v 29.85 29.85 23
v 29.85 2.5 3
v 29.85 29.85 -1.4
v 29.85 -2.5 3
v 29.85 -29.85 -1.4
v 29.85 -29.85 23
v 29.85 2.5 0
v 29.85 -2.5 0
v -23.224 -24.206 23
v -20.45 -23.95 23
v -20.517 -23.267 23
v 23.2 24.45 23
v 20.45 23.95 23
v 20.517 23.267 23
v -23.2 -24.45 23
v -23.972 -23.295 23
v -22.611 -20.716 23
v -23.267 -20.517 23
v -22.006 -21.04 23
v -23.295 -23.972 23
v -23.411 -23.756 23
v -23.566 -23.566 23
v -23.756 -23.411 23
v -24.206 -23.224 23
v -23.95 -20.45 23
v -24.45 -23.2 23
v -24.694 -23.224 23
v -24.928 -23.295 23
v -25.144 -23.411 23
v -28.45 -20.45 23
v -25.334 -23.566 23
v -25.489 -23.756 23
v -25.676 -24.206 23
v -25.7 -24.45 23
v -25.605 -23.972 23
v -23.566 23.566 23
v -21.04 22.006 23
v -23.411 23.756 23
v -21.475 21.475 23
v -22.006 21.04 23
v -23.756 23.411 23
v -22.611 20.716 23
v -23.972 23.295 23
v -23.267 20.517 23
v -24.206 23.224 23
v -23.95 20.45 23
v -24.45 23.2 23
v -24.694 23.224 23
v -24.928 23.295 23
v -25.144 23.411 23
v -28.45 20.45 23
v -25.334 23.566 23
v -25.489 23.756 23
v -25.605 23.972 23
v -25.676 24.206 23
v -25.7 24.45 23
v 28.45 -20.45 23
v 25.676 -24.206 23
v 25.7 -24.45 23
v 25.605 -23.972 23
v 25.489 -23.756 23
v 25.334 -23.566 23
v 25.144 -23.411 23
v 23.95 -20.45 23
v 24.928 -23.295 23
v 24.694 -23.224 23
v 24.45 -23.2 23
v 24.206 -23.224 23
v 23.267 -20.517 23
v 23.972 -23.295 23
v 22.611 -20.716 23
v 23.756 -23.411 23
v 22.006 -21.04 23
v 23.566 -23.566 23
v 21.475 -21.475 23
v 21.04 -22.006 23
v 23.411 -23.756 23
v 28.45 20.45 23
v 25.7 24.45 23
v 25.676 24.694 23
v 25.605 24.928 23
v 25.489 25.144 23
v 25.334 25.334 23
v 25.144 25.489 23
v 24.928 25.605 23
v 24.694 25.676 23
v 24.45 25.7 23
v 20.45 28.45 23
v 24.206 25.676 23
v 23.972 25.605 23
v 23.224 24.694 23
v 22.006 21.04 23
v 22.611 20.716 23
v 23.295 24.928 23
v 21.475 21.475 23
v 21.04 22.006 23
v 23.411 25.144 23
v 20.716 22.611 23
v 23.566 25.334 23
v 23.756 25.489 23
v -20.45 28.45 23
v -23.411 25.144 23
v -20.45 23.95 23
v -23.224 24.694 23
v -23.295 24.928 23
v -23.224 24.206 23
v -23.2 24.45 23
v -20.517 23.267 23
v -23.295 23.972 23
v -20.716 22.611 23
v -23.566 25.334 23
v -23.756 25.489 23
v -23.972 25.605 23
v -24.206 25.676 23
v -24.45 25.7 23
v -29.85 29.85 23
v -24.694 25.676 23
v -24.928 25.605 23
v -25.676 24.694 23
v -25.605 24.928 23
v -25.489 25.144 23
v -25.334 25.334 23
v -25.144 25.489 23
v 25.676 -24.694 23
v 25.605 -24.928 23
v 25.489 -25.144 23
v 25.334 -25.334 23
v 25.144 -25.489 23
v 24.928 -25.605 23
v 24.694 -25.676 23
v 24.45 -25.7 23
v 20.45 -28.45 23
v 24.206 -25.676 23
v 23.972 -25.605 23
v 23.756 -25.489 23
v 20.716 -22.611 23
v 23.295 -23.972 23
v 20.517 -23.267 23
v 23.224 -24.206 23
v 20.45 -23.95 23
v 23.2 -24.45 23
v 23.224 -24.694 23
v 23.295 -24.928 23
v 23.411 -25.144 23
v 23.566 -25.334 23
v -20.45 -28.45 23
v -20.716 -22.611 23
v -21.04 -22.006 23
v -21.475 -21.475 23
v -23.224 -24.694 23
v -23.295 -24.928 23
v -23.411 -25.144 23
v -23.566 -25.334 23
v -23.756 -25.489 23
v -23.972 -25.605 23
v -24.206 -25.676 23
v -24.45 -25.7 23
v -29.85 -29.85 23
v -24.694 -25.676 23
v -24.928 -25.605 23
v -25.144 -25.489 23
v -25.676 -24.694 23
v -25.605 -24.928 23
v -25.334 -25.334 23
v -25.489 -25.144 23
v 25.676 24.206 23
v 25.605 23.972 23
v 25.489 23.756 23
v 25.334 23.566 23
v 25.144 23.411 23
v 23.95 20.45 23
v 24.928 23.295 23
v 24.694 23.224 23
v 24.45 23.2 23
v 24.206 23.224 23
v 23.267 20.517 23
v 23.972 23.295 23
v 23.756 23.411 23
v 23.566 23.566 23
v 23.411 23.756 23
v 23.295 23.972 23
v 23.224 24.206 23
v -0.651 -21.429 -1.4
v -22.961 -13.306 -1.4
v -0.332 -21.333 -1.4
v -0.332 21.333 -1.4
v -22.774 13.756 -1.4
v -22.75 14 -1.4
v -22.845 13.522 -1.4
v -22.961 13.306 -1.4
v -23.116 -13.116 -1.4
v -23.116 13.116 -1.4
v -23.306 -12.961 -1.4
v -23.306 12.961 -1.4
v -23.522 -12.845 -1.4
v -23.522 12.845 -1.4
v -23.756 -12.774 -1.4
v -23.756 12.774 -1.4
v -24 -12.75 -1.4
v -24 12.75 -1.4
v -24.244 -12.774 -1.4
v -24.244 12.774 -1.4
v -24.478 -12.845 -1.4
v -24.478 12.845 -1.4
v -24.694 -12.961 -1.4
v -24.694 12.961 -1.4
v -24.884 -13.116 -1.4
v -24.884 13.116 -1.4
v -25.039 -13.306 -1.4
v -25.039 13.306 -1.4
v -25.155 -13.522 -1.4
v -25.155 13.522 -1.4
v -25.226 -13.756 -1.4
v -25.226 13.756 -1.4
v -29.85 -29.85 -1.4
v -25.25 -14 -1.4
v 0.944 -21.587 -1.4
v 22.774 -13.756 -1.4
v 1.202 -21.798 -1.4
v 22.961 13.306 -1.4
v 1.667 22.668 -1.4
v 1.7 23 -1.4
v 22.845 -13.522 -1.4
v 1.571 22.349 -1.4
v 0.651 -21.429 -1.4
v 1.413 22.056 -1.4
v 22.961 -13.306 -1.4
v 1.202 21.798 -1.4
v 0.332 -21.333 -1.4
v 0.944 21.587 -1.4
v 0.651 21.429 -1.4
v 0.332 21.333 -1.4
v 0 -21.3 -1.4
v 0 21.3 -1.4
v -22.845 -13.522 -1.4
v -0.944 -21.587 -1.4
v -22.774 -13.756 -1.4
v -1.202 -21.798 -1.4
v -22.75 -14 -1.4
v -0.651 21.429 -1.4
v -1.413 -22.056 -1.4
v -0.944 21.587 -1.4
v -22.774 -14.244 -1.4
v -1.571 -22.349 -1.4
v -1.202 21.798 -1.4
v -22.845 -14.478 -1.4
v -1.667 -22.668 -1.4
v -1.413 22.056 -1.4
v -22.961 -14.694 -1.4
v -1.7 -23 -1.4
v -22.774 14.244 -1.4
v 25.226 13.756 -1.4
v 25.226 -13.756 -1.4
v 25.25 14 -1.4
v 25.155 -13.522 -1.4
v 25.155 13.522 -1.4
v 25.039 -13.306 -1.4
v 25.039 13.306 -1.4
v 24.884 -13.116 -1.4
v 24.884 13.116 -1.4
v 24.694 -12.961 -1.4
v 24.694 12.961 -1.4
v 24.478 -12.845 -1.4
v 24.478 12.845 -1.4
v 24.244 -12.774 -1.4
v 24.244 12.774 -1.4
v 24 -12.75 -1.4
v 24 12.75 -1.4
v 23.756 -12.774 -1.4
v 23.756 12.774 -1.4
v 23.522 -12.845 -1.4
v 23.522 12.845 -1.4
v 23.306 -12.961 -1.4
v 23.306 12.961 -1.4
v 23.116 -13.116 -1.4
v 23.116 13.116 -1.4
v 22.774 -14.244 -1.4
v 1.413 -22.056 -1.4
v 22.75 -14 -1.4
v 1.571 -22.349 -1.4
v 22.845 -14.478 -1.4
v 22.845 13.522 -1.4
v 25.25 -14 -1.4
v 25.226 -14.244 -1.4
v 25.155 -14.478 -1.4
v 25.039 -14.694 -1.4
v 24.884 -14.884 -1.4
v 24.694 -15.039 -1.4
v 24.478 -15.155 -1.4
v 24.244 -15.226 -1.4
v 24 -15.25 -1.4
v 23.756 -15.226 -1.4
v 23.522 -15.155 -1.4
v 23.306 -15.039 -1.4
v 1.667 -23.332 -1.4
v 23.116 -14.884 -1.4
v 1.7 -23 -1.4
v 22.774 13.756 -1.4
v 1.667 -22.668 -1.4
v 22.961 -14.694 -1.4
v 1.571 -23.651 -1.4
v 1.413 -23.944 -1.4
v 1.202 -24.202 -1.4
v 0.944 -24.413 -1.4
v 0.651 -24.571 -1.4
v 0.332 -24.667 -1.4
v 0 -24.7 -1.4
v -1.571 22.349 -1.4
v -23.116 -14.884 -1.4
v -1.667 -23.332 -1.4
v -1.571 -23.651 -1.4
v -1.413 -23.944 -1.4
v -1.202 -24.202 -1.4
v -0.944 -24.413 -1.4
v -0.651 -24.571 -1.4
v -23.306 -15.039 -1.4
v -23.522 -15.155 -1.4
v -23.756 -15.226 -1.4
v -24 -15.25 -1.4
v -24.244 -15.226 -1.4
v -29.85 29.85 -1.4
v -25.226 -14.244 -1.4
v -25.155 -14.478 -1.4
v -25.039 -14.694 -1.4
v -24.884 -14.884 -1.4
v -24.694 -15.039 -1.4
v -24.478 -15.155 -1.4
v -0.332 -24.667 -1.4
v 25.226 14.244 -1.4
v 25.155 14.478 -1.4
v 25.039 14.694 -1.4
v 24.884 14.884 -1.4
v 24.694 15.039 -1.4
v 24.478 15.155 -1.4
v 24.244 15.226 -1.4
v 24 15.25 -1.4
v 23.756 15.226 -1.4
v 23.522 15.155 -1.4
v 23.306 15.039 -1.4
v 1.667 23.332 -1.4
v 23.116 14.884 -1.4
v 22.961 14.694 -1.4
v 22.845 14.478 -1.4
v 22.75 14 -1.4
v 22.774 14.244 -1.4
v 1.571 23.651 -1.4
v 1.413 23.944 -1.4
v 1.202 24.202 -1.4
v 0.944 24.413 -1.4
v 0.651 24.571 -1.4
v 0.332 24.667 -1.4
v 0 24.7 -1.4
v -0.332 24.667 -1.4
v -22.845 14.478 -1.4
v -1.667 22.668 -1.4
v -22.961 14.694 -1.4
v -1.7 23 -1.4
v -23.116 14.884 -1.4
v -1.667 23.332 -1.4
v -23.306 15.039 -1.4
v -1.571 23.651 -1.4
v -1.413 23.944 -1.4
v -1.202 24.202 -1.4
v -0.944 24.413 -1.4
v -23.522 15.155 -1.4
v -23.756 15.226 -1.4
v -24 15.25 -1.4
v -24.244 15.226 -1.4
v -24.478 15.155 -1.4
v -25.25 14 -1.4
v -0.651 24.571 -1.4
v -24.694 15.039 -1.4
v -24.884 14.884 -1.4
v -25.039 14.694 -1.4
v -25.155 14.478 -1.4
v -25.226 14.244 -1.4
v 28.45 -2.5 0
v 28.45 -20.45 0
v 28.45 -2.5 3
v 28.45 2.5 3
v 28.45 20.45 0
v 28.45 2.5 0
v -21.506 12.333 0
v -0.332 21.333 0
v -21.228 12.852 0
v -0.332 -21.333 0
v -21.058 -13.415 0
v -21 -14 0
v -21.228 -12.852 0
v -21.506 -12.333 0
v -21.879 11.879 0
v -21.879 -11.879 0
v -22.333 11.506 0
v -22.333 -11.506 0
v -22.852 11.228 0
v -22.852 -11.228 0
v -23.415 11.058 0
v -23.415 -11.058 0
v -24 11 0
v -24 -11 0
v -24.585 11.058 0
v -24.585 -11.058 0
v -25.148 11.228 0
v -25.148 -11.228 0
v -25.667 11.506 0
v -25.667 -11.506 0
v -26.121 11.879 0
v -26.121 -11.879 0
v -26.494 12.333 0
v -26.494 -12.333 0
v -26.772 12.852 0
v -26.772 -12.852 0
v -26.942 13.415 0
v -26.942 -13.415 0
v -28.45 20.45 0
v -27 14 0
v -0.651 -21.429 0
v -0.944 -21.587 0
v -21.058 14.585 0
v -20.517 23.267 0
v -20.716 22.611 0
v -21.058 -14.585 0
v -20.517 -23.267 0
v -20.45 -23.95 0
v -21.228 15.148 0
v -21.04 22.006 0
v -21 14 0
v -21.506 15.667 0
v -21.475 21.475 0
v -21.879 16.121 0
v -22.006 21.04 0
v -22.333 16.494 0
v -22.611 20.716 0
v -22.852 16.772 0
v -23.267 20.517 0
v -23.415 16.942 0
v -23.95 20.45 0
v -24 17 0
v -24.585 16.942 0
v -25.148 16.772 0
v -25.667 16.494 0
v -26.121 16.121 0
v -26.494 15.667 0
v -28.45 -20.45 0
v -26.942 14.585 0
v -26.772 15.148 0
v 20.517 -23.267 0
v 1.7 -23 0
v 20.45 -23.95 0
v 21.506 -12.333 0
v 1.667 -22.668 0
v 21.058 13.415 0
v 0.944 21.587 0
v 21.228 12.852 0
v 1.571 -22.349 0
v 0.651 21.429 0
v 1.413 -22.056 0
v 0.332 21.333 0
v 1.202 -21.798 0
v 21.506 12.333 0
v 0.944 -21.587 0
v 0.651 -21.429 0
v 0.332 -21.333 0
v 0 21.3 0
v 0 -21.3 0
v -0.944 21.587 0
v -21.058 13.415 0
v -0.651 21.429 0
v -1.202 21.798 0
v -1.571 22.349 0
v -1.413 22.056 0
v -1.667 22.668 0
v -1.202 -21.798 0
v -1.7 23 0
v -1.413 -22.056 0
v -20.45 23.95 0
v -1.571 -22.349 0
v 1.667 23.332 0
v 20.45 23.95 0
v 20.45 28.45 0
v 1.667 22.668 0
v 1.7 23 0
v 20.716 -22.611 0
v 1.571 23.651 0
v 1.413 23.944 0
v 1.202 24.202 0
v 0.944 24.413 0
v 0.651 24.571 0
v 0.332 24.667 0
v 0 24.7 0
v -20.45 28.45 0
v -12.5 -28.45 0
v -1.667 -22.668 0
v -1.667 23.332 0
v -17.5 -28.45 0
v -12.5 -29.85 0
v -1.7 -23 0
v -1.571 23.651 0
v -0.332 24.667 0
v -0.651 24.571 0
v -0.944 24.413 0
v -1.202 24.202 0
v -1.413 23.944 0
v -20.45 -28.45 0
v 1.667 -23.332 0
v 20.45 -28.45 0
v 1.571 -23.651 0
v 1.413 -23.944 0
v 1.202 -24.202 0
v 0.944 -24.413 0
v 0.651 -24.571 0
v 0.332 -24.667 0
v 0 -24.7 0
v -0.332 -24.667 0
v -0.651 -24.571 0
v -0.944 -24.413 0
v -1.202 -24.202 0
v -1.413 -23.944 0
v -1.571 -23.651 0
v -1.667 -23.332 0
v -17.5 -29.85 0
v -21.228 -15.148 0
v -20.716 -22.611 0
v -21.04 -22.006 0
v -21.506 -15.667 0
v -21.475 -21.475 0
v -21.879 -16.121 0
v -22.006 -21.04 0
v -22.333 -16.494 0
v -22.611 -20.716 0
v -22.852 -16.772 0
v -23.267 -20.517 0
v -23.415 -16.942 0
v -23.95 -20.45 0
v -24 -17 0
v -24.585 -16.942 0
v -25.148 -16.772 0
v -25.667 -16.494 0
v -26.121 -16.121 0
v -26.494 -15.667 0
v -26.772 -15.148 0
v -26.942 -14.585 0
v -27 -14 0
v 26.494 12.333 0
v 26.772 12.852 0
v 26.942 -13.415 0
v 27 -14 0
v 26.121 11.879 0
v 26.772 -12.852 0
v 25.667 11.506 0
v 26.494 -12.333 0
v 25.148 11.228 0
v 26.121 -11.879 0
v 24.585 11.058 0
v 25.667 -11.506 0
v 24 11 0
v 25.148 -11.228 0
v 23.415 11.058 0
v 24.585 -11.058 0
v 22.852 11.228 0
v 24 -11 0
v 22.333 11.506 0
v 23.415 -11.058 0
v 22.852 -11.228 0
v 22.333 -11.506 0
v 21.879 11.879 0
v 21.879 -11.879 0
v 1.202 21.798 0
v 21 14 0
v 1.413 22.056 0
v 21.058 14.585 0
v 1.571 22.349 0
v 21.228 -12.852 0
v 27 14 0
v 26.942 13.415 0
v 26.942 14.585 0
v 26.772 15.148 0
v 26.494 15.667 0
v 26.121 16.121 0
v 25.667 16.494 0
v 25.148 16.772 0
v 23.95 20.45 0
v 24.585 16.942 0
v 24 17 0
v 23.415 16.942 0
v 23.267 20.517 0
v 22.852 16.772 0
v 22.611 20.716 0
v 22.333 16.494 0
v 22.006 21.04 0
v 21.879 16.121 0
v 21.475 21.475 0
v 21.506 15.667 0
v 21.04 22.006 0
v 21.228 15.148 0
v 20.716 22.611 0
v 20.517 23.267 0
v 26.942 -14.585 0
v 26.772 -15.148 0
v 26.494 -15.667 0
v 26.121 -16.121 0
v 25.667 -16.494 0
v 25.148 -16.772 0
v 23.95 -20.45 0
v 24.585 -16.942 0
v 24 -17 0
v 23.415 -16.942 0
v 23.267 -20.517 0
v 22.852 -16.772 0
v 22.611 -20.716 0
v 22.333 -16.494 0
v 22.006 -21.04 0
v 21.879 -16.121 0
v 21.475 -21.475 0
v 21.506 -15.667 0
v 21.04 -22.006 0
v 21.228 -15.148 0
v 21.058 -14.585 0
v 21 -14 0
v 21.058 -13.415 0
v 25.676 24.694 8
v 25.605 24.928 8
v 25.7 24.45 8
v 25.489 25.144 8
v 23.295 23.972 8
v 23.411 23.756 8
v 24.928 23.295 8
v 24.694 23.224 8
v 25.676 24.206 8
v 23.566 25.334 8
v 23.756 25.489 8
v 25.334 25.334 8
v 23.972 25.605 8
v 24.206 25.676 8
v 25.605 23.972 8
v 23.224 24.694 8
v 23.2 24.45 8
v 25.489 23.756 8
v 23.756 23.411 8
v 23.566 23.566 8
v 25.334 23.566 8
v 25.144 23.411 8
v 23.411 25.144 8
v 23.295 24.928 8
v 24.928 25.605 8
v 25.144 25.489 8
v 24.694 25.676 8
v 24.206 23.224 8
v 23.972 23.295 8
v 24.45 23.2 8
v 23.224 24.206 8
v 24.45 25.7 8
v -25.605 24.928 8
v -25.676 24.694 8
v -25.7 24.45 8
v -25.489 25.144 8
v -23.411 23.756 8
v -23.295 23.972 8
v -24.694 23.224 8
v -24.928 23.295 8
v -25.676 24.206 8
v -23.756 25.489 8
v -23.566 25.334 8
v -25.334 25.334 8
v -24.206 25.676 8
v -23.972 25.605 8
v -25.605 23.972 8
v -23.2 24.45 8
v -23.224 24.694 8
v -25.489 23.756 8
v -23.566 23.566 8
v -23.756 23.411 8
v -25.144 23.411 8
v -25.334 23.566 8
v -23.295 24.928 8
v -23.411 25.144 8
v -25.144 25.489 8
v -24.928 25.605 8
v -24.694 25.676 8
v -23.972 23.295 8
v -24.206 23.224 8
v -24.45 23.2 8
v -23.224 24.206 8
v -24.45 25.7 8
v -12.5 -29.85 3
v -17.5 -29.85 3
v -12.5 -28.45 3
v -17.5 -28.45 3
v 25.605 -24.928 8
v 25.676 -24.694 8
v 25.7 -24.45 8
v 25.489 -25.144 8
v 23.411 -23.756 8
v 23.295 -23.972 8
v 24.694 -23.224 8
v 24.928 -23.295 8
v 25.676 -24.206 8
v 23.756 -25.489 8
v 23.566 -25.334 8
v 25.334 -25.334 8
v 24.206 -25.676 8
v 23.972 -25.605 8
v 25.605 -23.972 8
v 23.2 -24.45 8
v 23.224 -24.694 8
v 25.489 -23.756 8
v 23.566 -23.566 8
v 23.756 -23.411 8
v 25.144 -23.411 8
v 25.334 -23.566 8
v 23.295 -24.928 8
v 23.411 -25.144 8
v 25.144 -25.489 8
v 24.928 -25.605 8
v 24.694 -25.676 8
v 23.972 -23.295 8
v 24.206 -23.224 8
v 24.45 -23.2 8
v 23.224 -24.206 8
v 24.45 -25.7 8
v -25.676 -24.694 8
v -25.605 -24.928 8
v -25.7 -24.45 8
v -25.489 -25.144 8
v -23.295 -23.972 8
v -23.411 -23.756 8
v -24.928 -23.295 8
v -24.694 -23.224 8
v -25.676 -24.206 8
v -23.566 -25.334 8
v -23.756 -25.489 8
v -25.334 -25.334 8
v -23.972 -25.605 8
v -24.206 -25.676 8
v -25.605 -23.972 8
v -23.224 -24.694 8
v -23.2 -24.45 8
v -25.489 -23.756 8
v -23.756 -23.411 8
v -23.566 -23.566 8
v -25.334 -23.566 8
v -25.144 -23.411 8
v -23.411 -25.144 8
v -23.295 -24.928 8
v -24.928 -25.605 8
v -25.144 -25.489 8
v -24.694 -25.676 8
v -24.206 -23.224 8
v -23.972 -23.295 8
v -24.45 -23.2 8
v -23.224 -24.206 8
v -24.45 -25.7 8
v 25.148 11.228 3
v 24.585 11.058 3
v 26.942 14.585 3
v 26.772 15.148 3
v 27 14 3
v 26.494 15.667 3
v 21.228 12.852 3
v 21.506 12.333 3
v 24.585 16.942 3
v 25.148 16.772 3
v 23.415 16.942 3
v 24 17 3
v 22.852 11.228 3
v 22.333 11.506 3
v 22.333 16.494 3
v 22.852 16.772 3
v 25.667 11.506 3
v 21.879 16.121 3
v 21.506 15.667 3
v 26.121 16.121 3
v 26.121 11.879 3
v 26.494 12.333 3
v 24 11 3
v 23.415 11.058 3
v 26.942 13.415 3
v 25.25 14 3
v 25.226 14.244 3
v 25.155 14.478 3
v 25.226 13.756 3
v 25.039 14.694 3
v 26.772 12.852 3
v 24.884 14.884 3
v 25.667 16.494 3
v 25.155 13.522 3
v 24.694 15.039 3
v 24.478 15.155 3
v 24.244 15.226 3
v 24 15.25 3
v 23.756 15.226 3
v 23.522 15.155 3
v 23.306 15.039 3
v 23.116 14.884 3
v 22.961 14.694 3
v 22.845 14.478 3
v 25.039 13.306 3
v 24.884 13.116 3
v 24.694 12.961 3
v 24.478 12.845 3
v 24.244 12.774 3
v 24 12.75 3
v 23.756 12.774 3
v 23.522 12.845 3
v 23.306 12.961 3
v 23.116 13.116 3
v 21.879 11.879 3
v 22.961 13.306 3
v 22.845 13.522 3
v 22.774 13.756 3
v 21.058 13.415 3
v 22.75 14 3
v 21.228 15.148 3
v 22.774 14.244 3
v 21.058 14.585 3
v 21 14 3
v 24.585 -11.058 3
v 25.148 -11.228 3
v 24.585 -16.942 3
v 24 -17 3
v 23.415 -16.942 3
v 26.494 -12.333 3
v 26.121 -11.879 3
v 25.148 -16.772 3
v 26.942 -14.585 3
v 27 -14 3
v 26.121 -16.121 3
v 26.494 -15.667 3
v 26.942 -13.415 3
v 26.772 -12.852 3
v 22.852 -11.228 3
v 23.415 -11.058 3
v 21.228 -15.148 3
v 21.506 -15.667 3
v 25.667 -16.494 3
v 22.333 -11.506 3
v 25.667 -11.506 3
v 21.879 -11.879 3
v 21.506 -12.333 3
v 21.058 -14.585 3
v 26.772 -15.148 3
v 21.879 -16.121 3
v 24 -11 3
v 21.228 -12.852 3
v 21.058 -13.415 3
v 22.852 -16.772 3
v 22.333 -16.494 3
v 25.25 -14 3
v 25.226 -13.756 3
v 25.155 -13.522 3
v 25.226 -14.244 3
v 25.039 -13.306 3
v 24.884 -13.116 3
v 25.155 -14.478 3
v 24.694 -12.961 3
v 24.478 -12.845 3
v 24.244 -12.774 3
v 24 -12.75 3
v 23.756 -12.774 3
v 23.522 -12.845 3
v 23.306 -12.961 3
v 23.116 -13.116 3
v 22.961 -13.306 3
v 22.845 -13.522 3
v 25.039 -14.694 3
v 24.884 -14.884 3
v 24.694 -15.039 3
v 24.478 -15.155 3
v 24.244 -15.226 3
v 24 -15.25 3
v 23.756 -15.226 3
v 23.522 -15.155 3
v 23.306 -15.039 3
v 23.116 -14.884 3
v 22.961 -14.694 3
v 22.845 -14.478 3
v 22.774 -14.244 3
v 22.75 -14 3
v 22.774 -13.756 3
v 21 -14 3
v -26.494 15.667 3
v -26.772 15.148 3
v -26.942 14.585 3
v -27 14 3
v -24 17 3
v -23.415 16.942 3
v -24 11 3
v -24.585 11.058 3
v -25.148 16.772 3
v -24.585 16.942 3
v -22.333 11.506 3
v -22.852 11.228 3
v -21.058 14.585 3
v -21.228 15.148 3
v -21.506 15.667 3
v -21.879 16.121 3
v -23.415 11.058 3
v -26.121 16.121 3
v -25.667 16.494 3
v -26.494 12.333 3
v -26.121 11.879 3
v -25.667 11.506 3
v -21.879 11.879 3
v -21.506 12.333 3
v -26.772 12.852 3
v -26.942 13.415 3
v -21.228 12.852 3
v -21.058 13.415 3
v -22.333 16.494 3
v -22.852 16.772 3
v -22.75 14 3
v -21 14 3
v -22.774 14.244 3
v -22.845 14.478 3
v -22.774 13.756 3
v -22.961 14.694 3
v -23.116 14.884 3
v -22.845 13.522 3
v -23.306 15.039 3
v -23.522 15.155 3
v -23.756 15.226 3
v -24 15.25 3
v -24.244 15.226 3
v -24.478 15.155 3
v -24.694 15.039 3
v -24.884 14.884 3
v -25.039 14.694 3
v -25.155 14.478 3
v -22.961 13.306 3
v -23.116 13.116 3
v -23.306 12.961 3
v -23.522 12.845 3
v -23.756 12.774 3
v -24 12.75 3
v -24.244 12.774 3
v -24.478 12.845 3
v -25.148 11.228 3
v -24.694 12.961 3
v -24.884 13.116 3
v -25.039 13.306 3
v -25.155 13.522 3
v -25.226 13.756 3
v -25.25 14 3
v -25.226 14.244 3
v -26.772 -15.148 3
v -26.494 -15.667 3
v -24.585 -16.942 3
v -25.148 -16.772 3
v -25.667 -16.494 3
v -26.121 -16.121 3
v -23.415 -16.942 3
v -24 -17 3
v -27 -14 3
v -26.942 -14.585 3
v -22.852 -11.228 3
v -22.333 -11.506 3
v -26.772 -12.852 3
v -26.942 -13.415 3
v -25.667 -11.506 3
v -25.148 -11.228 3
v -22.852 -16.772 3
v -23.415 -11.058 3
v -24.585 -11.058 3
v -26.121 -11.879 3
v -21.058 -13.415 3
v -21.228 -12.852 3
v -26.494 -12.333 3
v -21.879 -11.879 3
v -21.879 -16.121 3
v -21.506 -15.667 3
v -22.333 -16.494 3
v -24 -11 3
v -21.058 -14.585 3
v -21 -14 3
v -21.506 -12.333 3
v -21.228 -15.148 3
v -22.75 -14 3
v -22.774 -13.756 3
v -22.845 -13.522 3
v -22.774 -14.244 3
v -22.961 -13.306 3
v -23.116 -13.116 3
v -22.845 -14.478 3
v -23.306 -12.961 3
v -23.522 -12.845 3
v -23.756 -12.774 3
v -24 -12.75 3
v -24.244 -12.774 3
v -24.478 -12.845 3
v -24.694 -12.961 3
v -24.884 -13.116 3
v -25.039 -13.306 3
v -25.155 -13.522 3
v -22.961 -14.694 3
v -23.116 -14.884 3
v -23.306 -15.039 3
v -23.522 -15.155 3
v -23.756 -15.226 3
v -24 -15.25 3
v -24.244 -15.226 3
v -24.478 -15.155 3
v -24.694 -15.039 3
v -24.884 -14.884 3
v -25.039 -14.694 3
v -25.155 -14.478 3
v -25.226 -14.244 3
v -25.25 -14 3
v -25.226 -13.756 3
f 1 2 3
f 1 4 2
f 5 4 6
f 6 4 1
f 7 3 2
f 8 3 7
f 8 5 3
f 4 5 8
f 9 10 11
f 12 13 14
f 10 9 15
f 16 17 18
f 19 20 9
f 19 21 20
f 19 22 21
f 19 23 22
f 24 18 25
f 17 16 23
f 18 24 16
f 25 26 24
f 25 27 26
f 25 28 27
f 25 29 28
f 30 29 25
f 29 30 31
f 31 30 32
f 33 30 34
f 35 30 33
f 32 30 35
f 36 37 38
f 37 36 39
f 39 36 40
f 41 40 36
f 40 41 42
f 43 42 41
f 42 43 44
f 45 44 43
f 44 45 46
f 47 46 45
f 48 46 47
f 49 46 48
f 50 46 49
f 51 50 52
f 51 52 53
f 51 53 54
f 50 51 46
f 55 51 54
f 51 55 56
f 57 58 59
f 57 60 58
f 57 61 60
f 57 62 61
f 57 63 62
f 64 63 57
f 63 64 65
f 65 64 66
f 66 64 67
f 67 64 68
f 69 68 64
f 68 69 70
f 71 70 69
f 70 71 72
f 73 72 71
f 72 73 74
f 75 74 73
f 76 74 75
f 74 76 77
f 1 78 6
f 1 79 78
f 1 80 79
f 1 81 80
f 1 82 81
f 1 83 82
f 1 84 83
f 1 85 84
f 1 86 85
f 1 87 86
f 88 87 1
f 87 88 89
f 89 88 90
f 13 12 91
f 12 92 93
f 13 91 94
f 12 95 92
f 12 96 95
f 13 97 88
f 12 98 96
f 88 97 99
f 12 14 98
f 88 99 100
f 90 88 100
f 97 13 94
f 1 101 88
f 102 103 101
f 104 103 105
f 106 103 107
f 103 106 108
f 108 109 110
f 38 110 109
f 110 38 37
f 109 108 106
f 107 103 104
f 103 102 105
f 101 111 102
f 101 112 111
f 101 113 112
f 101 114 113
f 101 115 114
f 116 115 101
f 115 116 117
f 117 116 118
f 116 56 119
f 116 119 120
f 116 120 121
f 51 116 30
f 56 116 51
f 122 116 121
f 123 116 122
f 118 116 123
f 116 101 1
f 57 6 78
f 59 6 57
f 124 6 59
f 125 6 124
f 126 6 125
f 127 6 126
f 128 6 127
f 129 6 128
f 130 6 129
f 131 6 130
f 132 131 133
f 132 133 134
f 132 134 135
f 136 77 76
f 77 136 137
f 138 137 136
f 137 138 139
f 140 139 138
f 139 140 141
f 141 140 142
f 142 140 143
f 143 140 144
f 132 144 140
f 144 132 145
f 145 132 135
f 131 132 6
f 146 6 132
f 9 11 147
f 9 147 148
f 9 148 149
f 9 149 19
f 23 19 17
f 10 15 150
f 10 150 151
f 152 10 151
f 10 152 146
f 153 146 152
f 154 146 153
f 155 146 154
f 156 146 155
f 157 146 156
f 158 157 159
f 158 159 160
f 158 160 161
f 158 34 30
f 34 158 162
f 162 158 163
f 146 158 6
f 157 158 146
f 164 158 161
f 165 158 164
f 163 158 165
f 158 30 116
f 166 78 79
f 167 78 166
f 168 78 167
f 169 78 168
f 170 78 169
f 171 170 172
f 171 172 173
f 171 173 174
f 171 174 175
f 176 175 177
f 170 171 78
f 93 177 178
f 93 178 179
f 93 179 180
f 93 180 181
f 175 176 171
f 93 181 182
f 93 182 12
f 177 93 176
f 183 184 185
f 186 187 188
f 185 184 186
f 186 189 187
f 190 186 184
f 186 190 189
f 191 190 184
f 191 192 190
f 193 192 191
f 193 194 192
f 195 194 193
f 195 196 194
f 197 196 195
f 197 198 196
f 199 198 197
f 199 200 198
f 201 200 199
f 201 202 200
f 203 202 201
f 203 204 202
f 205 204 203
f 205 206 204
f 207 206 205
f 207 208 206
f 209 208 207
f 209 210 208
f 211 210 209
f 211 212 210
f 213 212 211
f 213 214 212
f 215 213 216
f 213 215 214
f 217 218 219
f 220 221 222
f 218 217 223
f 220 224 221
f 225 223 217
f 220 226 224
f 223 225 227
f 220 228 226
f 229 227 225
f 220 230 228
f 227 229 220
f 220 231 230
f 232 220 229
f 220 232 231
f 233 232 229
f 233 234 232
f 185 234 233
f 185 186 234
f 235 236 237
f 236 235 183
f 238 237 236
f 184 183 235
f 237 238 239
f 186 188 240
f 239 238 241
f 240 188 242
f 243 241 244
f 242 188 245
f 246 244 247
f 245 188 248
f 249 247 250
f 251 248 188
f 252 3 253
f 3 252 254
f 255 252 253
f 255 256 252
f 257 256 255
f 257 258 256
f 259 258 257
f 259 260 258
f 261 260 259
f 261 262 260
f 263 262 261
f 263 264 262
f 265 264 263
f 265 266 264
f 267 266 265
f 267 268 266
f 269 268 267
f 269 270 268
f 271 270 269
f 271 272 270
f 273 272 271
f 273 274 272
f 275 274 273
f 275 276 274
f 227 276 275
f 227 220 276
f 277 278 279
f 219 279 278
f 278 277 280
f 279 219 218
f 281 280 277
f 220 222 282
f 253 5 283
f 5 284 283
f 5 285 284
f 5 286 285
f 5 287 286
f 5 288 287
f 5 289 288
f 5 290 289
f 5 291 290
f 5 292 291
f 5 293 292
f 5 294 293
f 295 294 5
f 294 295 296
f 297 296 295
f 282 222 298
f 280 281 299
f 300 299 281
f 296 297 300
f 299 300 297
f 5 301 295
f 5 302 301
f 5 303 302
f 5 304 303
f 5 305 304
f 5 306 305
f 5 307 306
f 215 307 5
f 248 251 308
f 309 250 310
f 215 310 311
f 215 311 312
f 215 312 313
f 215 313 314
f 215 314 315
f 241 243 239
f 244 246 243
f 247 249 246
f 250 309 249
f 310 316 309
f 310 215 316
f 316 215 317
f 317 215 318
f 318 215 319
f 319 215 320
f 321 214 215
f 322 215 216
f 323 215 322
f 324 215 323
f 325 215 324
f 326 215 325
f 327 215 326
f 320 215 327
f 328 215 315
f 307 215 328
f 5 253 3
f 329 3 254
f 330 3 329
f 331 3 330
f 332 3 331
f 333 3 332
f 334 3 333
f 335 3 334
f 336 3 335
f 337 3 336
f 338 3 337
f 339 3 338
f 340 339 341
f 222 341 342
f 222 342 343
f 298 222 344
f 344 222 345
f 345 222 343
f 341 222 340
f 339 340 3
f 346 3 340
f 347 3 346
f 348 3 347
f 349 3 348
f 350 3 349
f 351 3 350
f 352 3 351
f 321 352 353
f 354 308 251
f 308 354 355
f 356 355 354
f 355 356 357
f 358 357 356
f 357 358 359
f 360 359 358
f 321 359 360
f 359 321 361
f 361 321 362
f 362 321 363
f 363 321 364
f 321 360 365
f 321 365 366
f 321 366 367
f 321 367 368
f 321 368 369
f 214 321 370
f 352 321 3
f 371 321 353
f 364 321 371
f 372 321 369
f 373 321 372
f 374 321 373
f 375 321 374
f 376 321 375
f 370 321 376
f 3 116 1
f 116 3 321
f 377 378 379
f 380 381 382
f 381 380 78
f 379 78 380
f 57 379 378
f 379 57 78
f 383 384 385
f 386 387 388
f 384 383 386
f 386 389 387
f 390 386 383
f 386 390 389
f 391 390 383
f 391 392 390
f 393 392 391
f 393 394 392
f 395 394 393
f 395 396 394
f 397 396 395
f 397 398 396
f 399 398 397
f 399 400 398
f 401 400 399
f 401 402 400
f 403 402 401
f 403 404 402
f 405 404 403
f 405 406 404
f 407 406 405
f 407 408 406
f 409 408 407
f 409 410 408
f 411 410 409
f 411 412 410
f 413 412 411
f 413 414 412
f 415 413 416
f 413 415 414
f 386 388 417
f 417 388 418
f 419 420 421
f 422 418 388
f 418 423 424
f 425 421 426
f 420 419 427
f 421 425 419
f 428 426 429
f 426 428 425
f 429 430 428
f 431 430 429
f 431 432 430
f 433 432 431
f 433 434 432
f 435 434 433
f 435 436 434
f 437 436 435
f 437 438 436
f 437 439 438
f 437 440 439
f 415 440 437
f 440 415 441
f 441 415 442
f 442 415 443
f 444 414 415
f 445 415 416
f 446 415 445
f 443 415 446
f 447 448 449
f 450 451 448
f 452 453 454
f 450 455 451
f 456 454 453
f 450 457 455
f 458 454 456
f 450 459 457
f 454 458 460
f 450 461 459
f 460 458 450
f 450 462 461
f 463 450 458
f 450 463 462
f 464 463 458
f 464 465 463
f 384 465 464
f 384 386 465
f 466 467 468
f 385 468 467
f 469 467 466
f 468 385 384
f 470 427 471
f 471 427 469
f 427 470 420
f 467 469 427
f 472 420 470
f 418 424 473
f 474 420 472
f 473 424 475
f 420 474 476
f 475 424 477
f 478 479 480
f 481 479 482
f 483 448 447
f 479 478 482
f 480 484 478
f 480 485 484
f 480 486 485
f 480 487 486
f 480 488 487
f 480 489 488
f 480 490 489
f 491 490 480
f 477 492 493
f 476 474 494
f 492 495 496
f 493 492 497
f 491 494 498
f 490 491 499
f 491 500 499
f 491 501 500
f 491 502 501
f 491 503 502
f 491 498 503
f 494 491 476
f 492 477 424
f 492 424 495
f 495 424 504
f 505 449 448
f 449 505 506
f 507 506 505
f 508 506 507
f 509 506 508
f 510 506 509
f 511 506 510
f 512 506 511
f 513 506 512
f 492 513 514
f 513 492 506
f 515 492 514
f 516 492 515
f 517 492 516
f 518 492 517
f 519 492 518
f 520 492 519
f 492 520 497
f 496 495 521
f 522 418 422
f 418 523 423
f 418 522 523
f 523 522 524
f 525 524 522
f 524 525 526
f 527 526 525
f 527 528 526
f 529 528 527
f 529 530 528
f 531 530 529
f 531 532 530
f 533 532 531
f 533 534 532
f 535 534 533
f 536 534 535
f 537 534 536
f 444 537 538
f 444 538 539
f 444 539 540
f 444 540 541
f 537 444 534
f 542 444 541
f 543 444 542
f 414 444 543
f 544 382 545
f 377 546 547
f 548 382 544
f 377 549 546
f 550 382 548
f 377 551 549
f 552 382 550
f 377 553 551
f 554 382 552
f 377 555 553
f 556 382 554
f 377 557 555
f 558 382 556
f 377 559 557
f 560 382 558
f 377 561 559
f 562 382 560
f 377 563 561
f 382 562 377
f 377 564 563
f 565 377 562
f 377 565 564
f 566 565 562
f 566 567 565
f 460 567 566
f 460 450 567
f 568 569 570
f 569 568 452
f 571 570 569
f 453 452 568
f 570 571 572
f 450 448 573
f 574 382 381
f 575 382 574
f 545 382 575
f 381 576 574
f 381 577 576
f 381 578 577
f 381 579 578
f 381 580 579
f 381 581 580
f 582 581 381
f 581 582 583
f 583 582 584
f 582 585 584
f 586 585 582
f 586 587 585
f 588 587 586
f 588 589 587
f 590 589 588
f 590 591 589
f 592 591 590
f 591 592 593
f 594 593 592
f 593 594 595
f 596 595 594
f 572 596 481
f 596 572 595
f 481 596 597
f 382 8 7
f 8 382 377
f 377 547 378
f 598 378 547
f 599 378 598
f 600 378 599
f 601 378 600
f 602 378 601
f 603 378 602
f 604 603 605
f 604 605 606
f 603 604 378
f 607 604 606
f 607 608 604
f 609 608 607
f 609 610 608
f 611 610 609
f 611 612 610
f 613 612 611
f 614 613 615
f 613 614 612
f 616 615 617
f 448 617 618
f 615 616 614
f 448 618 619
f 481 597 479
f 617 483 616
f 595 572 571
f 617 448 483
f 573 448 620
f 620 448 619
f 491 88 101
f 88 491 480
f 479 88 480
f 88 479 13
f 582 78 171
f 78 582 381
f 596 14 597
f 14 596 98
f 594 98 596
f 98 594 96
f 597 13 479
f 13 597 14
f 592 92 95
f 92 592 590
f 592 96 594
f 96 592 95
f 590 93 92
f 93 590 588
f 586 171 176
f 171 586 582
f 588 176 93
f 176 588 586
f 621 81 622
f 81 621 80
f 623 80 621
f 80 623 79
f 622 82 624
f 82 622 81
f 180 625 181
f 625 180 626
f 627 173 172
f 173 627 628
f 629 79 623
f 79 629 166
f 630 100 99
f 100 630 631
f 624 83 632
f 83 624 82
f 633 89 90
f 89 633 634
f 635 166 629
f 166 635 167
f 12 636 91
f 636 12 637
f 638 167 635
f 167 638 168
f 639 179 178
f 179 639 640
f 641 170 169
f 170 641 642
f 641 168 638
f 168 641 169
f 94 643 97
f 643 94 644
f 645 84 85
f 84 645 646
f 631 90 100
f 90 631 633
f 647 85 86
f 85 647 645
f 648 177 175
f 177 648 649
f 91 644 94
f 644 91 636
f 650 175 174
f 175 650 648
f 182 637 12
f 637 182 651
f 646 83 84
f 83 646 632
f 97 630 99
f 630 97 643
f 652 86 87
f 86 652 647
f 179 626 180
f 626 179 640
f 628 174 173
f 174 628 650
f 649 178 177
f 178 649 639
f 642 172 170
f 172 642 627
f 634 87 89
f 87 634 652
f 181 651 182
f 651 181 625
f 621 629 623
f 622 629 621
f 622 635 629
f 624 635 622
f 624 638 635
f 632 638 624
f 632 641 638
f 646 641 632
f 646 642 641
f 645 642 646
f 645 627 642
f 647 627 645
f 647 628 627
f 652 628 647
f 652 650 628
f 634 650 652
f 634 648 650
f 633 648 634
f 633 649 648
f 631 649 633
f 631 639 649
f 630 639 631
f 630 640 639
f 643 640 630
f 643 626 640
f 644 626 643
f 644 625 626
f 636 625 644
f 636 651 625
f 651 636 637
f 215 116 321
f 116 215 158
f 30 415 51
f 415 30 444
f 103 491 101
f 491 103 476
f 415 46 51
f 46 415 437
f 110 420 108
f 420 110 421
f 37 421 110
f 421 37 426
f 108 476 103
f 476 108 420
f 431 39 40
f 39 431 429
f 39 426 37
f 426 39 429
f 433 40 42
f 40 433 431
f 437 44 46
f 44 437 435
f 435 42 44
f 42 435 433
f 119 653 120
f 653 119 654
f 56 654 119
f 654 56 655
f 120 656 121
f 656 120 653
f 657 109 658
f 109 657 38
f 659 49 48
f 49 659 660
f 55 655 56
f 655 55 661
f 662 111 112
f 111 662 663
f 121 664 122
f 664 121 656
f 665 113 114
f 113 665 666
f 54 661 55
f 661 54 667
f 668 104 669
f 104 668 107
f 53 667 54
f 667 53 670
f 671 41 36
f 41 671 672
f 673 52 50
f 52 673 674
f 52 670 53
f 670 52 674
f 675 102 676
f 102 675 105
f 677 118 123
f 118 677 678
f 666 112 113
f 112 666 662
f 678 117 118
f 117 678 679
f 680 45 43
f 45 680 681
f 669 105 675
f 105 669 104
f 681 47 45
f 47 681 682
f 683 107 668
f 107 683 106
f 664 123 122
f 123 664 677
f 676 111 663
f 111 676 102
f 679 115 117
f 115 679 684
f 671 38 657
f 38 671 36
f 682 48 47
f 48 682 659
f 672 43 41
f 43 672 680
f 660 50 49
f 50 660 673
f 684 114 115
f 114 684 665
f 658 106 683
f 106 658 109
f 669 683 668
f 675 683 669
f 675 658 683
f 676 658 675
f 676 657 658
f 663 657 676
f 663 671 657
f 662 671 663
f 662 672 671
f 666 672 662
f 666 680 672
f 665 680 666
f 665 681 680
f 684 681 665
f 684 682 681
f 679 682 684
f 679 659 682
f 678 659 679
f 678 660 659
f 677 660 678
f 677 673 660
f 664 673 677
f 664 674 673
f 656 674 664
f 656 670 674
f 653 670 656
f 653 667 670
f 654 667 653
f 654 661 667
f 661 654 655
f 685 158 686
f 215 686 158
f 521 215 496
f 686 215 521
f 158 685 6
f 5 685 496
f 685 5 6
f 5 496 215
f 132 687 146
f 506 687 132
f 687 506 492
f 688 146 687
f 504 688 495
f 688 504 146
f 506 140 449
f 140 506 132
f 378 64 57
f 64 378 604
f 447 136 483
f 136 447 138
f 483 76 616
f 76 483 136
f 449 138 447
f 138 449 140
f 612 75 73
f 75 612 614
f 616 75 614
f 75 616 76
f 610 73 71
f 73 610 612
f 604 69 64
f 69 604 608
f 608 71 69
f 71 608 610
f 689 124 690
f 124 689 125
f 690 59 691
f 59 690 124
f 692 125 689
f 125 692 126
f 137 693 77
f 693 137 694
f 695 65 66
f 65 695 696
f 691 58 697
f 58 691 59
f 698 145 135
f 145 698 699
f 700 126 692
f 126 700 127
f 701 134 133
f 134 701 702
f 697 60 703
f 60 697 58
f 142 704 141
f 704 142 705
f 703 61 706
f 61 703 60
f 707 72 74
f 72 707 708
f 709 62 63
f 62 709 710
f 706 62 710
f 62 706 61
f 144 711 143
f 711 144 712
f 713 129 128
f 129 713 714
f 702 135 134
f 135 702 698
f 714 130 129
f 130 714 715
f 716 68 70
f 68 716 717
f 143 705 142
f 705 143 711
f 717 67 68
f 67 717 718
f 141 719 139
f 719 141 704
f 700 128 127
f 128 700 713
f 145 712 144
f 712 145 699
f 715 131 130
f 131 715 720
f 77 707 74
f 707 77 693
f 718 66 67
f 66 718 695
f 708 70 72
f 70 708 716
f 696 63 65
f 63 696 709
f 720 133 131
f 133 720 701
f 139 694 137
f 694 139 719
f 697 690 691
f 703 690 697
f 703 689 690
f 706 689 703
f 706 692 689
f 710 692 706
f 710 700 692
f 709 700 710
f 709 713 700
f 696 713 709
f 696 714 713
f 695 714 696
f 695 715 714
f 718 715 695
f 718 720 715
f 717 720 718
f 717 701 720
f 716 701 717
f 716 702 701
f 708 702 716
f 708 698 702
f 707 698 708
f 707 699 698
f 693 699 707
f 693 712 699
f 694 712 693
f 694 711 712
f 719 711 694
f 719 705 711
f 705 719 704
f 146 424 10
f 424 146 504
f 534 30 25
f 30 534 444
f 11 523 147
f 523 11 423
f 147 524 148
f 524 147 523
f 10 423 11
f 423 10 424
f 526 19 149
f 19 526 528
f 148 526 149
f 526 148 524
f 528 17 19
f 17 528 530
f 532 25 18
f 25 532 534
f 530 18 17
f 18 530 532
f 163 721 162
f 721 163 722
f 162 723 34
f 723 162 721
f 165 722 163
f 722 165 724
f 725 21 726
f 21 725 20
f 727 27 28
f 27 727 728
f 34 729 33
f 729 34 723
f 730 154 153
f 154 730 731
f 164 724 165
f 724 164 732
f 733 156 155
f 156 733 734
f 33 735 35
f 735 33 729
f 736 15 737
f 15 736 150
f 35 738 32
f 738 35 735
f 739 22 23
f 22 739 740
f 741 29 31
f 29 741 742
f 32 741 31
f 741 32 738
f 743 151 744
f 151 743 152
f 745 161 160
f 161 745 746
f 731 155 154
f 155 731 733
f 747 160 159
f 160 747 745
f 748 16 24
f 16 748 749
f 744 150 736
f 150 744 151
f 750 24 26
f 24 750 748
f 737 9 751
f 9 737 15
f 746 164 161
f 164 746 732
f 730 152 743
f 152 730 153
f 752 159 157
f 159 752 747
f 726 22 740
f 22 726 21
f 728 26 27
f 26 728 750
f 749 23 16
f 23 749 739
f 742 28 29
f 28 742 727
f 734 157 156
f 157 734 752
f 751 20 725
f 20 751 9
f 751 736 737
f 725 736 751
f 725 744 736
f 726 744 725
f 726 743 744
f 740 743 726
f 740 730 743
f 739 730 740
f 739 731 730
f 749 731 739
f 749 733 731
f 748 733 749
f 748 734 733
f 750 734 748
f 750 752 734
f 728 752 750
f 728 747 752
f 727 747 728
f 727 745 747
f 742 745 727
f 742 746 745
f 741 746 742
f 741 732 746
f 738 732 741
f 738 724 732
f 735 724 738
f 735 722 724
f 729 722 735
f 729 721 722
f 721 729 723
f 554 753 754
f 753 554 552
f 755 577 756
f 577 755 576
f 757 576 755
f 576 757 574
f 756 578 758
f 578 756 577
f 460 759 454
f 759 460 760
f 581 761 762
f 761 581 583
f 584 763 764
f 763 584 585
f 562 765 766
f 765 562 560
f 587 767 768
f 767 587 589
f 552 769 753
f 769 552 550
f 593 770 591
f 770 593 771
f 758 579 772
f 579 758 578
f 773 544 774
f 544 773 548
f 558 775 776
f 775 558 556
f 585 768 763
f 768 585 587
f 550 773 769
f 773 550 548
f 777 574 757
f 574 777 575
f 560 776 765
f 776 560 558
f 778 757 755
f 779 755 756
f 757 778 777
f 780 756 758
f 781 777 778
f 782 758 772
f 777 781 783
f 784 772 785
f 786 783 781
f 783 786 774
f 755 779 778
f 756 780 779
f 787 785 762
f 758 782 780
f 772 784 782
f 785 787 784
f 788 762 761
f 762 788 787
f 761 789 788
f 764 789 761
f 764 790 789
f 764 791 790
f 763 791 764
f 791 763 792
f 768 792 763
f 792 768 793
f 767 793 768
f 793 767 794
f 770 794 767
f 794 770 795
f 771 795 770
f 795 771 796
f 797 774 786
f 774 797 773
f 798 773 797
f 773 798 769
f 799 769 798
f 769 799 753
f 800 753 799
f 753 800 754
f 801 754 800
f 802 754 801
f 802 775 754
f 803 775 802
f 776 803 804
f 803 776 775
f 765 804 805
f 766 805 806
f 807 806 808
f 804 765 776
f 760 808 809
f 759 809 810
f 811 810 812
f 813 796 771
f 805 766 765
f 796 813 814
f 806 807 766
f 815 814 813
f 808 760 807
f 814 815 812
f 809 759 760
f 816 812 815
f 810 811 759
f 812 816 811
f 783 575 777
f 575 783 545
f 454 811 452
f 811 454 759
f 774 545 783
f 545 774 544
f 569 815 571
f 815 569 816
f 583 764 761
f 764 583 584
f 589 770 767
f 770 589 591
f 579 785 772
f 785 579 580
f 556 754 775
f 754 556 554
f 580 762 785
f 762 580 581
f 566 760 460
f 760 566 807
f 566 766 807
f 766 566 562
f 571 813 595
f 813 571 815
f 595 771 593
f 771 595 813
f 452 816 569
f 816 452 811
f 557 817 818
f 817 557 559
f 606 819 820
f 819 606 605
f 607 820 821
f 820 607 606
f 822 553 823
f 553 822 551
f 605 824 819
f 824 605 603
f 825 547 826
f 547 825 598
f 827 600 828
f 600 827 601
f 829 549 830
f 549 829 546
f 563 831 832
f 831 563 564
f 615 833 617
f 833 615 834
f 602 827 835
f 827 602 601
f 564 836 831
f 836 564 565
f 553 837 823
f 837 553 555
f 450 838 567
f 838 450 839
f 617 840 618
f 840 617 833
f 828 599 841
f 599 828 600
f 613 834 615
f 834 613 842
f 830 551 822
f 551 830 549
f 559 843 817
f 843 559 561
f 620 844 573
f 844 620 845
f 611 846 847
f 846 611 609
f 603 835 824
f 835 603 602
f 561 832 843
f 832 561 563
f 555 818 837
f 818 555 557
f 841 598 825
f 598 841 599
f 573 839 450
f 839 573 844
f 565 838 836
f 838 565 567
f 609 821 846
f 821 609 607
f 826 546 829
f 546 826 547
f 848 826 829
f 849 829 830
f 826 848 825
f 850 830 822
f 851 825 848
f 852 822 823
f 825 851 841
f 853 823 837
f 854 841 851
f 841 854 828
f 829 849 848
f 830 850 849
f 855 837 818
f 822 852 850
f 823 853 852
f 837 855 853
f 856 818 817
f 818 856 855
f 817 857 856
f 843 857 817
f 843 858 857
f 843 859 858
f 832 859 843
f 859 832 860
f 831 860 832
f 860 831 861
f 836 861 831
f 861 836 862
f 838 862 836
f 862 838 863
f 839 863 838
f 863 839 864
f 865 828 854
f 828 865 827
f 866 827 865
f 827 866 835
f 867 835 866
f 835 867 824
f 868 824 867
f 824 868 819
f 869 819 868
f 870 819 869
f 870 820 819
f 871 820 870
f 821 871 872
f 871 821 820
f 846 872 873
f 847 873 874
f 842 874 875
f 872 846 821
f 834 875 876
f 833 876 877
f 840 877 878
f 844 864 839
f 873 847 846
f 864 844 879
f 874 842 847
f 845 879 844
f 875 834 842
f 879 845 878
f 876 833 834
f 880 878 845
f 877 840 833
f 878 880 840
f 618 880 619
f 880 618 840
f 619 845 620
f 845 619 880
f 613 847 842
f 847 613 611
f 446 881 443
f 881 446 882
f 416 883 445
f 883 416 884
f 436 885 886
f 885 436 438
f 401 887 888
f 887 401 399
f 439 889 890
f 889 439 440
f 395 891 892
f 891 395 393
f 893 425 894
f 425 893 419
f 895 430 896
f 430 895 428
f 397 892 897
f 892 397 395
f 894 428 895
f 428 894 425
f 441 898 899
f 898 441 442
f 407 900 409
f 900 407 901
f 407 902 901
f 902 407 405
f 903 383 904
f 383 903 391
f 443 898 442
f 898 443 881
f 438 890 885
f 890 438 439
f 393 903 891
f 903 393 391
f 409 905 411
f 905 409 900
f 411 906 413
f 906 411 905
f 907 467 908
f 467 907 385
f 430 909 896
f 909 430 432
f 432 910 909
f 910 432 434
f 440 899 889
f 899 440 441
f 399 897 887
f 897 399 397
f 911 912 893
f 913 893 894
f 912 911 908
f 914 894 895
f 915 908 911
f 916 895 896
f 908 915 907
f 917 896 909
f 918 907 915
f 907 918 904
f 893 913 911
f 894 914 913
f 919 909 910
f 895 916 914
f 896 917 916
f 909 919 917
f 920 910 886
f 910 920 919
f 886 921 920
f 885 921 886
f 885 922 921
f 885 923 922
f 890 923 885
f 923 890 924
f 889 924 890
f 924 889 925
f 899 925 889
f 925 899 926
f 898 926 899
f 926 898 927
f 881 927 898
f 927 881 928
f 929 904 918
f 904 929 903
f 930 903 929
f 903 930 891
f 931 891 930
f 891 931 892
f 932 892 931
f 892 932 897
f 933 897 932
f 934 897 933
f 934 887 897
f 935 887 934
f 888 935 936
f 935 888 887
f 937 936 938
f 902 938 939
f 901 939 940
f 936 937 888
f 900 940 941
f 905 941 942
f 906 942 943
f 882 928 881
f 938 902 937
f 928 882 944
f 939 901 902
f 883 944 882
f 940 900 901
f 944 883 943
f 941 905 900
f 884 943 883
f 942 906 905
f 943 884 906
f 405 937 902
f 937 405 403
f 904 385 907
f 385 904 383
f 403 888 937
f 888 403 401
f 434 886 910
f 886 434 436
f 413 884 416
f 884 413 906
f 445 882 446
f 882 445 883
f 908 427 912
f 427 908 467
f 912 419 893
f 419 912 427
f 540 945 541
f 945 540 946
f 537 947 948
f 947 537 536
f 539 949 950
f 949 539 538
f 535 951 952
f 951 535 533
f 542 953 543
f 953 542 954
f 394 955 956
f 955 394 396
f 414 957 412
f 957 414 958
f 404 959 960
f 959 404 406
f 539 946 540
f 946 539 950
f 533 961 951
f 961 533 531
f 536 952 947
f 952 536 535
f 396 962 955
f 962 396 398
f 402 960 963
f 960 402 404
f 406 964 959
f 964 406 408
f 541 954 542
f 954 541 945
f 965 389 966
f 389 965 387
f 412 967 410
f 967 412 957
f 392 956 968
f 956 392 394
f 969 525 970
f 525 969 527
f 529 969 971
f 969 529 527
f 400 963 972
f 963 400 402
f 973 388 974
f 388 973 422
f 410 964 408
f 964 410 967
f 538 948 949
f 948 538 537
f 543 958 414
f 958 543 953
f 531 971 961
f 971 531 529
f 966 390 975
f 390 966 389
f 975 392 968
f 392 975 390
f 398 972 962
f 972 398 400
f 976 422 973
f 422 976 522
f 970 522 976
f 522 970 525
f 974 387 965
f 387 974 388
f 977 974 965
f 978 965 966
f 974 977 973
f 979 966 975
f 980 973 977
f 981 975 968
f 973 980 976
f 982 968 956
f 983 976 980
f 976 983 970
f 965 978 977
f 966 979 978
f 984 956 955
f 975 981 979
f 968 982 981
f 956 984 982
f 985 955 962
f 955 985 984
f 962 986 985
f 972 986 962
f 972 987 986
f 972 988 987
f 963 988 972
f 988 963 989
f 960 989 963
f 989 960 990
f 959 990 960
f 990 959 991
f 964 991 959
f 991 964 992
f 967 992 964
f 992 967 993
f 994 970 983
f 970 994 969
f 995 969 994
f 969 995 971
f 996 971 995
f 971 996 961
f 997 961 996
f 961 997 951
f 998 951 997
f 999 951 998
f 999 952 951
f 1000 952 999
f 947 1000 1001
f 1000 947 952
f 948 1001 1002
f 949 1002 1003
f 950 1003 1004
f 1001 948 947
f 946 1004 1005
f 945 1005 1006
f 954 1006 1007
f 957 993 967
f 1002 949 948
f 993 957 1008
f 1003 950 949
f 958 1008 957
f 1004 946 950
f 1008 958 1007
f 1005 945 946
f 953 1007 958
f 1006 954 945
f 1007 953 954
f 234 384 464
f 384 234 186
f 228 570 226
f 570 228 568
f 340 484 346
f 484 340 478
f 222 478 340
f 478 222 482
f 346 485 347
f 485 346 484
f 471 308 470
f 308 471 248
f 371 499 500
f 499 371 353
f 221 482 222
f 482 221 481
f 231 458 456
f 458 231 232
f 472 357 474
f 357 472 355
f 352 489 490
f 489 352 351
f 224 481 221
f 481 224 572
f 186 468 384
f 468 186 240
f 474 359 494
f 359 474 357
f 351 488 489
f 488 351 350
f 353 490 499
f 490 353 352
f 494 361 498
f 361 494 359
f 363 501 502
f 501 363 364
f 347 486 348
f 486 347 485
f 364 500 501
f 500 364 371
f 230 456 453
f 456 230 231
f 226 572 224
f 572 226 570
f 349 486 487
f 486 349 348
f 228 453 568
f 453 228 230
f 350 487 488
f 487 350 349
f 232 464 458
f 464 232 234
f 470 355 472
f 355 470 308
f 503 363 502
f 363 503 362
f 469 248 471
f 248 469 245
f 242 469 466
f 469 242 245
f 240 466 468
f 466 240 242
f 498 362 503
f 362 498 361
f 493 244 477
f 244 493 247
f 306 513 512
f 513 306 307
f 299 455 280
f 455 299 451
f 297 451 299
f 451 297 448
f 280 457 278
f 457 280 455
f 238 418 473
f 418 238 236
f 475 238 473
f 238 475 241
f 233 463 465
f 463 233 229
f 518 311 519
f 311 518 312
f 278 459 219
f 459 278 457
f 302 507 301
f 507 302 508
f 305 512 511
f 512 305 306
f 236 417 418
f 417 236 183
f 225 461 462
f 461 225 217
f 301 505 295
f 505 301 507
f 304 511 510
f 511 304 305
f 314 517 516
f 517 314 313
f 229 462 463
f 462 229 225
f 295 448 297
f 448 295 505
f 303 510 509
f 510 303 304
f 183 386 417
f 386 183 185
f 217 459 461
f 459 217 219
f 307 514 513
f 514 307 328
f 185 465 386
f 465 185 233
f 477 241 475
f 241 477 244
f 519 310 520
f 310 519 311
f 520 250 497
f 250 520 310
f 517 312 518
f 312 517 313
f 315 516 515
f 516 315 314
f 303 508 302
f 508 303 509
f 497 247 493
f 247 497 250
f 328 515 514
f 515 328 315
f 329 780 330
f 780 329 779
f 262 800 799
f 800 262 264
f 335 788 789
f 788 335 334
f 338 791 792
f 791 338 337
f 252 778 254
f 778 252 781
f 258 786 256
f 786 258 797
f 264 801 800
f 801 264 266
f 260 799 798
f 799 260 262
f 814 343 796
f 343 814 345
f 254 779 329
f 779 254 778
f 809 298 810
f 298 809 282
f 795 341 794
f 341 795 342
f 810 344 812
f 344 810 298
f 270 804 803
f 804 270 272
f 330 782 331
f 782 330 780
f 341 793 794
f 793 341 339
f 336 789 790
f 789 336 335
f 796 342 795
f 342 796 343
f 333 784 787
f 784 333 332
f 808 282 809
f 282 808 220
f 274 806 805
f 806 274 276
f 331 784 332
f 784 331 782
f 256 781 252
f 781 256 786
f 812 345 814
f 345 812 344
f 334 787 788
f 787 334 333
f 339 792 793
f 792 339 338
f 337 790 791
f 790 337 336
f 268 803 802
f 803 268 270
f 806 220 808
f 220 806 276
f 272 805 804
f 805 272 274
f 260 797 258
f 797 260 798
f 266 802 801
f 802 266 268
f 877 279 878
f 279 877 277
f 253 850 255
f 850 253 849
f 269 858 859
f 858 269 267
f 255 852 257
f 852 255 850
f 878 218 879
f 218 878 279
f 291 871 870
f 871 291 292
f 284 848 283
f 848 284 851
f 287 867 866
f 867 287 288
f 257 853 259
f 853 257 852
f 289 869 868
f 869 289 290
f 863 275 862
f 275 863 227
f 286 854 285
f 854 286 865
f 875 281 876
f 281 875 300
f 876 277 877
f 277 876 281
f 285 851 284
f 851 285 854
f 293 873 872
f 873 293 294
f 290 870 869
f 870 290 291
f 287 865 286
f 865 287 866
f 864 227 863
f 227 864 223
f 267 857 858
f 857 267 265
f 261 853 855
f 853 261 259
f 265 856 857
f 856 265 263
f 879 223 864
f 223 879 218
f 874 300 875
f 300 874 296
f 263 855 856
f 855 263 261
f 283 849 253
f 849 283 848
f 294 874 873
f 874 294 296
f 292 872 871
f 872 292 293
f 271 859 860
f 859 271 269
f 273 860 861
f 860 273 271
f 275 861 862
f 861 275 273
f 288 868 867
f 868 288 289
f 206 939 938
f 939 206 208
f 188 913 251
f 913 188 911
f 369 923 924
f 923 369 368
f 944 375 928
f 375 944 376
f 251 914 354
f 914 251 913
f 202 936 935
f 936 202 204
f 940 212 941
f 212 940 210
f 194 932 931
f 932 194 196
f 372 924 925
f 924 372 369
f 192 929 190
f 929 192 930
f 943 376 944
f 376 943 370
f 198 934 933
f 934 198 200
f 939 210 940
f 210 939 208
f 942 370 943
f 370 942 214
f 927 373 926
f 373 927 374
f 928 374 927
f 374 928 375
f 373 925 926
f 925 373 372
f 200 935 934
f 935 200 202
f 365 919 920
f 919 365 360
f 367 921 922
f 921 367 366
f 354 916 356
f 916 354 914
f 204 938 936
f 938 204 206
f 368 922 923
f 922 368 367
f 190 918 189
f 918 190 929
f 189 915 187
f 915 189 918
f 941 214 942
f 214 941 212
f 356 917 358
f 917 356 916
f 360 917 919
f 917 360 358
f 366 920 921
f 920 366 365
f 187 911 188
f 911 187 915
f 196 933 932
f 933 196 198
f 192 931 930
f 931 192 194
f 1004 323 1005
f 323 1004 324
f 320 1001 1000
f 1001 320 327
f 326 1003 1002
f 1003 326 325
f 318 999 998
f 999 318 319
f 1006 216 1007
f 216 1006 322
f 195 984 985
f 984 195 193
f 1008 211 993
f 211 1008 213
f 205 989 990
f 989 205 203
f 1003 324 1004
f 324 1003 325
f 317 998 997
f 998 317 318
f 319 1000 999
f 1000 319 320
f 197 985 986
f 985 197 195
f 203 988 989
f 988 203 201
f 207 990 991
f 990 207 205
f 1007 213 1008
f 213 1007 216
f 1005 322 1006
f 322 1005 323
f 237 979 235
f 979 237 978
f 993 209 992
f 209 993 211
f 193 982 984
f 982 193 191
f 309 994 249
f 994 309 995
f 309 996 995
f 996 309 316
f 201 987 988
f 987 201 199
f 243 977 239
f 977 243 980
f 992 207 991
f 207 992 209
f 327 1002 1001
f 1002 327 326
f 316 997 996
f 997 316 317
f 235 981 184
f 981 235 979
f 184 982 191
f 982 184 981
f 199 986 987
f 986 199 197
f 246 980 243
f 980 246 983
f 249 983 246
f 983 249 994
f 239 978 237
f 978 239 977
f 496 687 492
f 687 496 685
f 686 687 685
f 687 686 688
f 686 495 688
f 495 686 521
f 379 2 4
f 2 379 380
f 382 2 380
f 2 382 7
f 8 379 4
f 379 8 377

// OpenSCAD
// file: door-case-params.scad
/*	
	k4cg door-status
	Copyright (C) 2017  Christian Carlowitz <chca@cmesh.de>

	This program is free software: you can redistribute it and/or modify
	it under the terms of the GNU General Public License as published by
	the Free Software Foundation, either version 3 of the License, or
	(at your option) any later version.

	This program is distributed in the hope that it will be useful,
	but WITHOUT ANY WARRANTY; without even the implied warranty of
	MERCHANTABILITY or FITNESS FOR A PARTICULAR PURPOSE.  See the
	GNU General Public License for more details.

	You should have received a copy of the GNU General Public License
	along with this program.  If not, see <http://www.gnu.org/licenses/>.
*/

eps = 0.1;
$fn=32;

boardGap = 1;
boardX = 55+eps; // PCB width
boardY = 55+eps; // PCB depth
boardZ = 0; // PCB height
addZ = 23; // additional Y height until top part begins
wall = 1.4; // casing wall thickness
wallInsetW = 0;
wallInsetH = 0;
wallInsetOff = 0.2;

bottomHeight = 1.4;

mountR = 3;
mountW = 7;
mountHeight = boardZ+addZ;
mountDrill = 2.5;

screwSinkH = 2.5;
screwSinkD = 6.5;

// top plate
topHeight = 3.5;
// main file
/*	
	k4cg door-status
	Copyright (C) 2017  Christian Carlowitz <chca@cmesh.de>

	This program is free software: you can redistribute it and/or modify
	it under the terms of the GNU General Public License as published by
	the Free Software Foundation, either version 3 of the License, or
	(at your option) any later version.

	This program is distributed in the hope that it will be useful,
	but WITHOUT ANY WARRANTY; without even the implied warranty of
	MERCHANTABILITY or FITNESS FOR A PARTICULAR PURPOSE.  See the
	GNU General Public License for more details.

	You should have received a copy of the GNU General Public License
	along with this program.  If not, see <http://www.gnu.org/licenses/>.
*/

// *** all dimensions in mm ***

include <door-case-params.scad>

module shell(w,bh,x,y,z,winw,winh)
{
	difference()
	{
		union()
		{
			translate([0,0,-bh])
				cube([w+x, w+y, z+bh]); // outer volume
			cube([x+winw,y+winw,z+winh]);
		}
		translate([-eps,-eps,0])
			cube([x+eps,y+eps,z+eps+winh]); // inner volume
	}
}

module mount(w,r,h,off)
{
	union()
	{
		translate([0,0,-eps])
		linear_extrude(height=h+eps)
		polygon(points=[[off+eps,off+eps],[-w,off+eps],
			[-w,-w/2],[-w/2,-w],[off+eps,-w] ]);
		
		translate([-w/2,-w/2,-eps])
		cylinder(h=h+eps, r=w/2);
	}
}

module mountr(x,y,r,h)
{
	translate([x-r,y-r,-eps])
	cylinder(h=h+eps, r=r);
}

module case()
{
	difference()
	{
		union()
		{
			// outer case shell
			shell(wall, bottomHeight, boardX/2+boardGap, boardY/2+boardGap, boardZ+addZ,
				wallInsetW, wallInsetH);

			// pc mount feature
			translate([boardX/2, boardY/2, 0])
			{
				mount(mountW, mountR, mountHeight, boardGap, mountDrill);
			}
		}

		translate([boardX/2, boardY/2])
		translate([-mountR,-mountR,addZ-15])
		{
			// screw drill
			cylinder(h=(15+2*eps), r=mountDrill/2);
		}
	}
}

module cut(x,y,w,h)
{
	translate([x-w/2,y-h/2,-bottomHeight-eps])
	cube([w,h,bottomHeight+2*eps]);
}

module cutr(x,y,r,hadd=0)
{
    translate([x,y,-bottomHeight-eps])
    cylinder(h=bottomHeight+2*eps+hadd, r=r);
}

module cutWall(x,y,w,d,h)
{
	translate([x-w/2,y-d/2,0])
	cube([w,d,h]);
}

union()
{
	difference()
	{
		union()
		{
			translate([-eps,-eps,0])
			case();

			mirror([-1,0,0])
			translate([-eps,-eps,0])
			case();

			mirror([0,-1,0])
			translate([-eps,-eps,0])
			case();

			mirror([0,-1,0])
			mirror([-1,0,0])
			translate([-eps,-eps,0])
			case();

			mountr(50/2+2,30/2+2,3,3);

			mirror([0,-1,0])
			mountr(50/2+2,30/2+2,3,3);
			
			mirror([-1,0,0])
			mountr(50/2+2,30/2+2,3,3);

			mirror([0,-1,0])
			mirror([-1,0,0])
			mountr(50/2+2,30/2+2,3,3);

		}

		cutr(0,23,3.4/2);
		cutr(0,-23,3.4/2);
		
		cutr(50/2+2-3,30/2+2-3,2.5/2,hadd=10);
		mirror([0,-1,0])
		cutr(50/2+2-3,30/2+2-3,2.5/2,hadd=10);
		mirror([-1,0,0])
		cutr(50/2+2-3,30/2+2-3,2.5/2,hadd=10);
		mirror([0,-1,0])
		mirror([-1,0,0])
		cutr(50/2+2-3,30/2+2-3,2.5/2,hadd=10);
		
		cutWall(-15,-boardY/2,5,10,3);
		cutWall(boardX/2,0,10,5,3);
		
	}
}

//translate([0,0,boardZ+addZ]) import("test1-top.stl");
